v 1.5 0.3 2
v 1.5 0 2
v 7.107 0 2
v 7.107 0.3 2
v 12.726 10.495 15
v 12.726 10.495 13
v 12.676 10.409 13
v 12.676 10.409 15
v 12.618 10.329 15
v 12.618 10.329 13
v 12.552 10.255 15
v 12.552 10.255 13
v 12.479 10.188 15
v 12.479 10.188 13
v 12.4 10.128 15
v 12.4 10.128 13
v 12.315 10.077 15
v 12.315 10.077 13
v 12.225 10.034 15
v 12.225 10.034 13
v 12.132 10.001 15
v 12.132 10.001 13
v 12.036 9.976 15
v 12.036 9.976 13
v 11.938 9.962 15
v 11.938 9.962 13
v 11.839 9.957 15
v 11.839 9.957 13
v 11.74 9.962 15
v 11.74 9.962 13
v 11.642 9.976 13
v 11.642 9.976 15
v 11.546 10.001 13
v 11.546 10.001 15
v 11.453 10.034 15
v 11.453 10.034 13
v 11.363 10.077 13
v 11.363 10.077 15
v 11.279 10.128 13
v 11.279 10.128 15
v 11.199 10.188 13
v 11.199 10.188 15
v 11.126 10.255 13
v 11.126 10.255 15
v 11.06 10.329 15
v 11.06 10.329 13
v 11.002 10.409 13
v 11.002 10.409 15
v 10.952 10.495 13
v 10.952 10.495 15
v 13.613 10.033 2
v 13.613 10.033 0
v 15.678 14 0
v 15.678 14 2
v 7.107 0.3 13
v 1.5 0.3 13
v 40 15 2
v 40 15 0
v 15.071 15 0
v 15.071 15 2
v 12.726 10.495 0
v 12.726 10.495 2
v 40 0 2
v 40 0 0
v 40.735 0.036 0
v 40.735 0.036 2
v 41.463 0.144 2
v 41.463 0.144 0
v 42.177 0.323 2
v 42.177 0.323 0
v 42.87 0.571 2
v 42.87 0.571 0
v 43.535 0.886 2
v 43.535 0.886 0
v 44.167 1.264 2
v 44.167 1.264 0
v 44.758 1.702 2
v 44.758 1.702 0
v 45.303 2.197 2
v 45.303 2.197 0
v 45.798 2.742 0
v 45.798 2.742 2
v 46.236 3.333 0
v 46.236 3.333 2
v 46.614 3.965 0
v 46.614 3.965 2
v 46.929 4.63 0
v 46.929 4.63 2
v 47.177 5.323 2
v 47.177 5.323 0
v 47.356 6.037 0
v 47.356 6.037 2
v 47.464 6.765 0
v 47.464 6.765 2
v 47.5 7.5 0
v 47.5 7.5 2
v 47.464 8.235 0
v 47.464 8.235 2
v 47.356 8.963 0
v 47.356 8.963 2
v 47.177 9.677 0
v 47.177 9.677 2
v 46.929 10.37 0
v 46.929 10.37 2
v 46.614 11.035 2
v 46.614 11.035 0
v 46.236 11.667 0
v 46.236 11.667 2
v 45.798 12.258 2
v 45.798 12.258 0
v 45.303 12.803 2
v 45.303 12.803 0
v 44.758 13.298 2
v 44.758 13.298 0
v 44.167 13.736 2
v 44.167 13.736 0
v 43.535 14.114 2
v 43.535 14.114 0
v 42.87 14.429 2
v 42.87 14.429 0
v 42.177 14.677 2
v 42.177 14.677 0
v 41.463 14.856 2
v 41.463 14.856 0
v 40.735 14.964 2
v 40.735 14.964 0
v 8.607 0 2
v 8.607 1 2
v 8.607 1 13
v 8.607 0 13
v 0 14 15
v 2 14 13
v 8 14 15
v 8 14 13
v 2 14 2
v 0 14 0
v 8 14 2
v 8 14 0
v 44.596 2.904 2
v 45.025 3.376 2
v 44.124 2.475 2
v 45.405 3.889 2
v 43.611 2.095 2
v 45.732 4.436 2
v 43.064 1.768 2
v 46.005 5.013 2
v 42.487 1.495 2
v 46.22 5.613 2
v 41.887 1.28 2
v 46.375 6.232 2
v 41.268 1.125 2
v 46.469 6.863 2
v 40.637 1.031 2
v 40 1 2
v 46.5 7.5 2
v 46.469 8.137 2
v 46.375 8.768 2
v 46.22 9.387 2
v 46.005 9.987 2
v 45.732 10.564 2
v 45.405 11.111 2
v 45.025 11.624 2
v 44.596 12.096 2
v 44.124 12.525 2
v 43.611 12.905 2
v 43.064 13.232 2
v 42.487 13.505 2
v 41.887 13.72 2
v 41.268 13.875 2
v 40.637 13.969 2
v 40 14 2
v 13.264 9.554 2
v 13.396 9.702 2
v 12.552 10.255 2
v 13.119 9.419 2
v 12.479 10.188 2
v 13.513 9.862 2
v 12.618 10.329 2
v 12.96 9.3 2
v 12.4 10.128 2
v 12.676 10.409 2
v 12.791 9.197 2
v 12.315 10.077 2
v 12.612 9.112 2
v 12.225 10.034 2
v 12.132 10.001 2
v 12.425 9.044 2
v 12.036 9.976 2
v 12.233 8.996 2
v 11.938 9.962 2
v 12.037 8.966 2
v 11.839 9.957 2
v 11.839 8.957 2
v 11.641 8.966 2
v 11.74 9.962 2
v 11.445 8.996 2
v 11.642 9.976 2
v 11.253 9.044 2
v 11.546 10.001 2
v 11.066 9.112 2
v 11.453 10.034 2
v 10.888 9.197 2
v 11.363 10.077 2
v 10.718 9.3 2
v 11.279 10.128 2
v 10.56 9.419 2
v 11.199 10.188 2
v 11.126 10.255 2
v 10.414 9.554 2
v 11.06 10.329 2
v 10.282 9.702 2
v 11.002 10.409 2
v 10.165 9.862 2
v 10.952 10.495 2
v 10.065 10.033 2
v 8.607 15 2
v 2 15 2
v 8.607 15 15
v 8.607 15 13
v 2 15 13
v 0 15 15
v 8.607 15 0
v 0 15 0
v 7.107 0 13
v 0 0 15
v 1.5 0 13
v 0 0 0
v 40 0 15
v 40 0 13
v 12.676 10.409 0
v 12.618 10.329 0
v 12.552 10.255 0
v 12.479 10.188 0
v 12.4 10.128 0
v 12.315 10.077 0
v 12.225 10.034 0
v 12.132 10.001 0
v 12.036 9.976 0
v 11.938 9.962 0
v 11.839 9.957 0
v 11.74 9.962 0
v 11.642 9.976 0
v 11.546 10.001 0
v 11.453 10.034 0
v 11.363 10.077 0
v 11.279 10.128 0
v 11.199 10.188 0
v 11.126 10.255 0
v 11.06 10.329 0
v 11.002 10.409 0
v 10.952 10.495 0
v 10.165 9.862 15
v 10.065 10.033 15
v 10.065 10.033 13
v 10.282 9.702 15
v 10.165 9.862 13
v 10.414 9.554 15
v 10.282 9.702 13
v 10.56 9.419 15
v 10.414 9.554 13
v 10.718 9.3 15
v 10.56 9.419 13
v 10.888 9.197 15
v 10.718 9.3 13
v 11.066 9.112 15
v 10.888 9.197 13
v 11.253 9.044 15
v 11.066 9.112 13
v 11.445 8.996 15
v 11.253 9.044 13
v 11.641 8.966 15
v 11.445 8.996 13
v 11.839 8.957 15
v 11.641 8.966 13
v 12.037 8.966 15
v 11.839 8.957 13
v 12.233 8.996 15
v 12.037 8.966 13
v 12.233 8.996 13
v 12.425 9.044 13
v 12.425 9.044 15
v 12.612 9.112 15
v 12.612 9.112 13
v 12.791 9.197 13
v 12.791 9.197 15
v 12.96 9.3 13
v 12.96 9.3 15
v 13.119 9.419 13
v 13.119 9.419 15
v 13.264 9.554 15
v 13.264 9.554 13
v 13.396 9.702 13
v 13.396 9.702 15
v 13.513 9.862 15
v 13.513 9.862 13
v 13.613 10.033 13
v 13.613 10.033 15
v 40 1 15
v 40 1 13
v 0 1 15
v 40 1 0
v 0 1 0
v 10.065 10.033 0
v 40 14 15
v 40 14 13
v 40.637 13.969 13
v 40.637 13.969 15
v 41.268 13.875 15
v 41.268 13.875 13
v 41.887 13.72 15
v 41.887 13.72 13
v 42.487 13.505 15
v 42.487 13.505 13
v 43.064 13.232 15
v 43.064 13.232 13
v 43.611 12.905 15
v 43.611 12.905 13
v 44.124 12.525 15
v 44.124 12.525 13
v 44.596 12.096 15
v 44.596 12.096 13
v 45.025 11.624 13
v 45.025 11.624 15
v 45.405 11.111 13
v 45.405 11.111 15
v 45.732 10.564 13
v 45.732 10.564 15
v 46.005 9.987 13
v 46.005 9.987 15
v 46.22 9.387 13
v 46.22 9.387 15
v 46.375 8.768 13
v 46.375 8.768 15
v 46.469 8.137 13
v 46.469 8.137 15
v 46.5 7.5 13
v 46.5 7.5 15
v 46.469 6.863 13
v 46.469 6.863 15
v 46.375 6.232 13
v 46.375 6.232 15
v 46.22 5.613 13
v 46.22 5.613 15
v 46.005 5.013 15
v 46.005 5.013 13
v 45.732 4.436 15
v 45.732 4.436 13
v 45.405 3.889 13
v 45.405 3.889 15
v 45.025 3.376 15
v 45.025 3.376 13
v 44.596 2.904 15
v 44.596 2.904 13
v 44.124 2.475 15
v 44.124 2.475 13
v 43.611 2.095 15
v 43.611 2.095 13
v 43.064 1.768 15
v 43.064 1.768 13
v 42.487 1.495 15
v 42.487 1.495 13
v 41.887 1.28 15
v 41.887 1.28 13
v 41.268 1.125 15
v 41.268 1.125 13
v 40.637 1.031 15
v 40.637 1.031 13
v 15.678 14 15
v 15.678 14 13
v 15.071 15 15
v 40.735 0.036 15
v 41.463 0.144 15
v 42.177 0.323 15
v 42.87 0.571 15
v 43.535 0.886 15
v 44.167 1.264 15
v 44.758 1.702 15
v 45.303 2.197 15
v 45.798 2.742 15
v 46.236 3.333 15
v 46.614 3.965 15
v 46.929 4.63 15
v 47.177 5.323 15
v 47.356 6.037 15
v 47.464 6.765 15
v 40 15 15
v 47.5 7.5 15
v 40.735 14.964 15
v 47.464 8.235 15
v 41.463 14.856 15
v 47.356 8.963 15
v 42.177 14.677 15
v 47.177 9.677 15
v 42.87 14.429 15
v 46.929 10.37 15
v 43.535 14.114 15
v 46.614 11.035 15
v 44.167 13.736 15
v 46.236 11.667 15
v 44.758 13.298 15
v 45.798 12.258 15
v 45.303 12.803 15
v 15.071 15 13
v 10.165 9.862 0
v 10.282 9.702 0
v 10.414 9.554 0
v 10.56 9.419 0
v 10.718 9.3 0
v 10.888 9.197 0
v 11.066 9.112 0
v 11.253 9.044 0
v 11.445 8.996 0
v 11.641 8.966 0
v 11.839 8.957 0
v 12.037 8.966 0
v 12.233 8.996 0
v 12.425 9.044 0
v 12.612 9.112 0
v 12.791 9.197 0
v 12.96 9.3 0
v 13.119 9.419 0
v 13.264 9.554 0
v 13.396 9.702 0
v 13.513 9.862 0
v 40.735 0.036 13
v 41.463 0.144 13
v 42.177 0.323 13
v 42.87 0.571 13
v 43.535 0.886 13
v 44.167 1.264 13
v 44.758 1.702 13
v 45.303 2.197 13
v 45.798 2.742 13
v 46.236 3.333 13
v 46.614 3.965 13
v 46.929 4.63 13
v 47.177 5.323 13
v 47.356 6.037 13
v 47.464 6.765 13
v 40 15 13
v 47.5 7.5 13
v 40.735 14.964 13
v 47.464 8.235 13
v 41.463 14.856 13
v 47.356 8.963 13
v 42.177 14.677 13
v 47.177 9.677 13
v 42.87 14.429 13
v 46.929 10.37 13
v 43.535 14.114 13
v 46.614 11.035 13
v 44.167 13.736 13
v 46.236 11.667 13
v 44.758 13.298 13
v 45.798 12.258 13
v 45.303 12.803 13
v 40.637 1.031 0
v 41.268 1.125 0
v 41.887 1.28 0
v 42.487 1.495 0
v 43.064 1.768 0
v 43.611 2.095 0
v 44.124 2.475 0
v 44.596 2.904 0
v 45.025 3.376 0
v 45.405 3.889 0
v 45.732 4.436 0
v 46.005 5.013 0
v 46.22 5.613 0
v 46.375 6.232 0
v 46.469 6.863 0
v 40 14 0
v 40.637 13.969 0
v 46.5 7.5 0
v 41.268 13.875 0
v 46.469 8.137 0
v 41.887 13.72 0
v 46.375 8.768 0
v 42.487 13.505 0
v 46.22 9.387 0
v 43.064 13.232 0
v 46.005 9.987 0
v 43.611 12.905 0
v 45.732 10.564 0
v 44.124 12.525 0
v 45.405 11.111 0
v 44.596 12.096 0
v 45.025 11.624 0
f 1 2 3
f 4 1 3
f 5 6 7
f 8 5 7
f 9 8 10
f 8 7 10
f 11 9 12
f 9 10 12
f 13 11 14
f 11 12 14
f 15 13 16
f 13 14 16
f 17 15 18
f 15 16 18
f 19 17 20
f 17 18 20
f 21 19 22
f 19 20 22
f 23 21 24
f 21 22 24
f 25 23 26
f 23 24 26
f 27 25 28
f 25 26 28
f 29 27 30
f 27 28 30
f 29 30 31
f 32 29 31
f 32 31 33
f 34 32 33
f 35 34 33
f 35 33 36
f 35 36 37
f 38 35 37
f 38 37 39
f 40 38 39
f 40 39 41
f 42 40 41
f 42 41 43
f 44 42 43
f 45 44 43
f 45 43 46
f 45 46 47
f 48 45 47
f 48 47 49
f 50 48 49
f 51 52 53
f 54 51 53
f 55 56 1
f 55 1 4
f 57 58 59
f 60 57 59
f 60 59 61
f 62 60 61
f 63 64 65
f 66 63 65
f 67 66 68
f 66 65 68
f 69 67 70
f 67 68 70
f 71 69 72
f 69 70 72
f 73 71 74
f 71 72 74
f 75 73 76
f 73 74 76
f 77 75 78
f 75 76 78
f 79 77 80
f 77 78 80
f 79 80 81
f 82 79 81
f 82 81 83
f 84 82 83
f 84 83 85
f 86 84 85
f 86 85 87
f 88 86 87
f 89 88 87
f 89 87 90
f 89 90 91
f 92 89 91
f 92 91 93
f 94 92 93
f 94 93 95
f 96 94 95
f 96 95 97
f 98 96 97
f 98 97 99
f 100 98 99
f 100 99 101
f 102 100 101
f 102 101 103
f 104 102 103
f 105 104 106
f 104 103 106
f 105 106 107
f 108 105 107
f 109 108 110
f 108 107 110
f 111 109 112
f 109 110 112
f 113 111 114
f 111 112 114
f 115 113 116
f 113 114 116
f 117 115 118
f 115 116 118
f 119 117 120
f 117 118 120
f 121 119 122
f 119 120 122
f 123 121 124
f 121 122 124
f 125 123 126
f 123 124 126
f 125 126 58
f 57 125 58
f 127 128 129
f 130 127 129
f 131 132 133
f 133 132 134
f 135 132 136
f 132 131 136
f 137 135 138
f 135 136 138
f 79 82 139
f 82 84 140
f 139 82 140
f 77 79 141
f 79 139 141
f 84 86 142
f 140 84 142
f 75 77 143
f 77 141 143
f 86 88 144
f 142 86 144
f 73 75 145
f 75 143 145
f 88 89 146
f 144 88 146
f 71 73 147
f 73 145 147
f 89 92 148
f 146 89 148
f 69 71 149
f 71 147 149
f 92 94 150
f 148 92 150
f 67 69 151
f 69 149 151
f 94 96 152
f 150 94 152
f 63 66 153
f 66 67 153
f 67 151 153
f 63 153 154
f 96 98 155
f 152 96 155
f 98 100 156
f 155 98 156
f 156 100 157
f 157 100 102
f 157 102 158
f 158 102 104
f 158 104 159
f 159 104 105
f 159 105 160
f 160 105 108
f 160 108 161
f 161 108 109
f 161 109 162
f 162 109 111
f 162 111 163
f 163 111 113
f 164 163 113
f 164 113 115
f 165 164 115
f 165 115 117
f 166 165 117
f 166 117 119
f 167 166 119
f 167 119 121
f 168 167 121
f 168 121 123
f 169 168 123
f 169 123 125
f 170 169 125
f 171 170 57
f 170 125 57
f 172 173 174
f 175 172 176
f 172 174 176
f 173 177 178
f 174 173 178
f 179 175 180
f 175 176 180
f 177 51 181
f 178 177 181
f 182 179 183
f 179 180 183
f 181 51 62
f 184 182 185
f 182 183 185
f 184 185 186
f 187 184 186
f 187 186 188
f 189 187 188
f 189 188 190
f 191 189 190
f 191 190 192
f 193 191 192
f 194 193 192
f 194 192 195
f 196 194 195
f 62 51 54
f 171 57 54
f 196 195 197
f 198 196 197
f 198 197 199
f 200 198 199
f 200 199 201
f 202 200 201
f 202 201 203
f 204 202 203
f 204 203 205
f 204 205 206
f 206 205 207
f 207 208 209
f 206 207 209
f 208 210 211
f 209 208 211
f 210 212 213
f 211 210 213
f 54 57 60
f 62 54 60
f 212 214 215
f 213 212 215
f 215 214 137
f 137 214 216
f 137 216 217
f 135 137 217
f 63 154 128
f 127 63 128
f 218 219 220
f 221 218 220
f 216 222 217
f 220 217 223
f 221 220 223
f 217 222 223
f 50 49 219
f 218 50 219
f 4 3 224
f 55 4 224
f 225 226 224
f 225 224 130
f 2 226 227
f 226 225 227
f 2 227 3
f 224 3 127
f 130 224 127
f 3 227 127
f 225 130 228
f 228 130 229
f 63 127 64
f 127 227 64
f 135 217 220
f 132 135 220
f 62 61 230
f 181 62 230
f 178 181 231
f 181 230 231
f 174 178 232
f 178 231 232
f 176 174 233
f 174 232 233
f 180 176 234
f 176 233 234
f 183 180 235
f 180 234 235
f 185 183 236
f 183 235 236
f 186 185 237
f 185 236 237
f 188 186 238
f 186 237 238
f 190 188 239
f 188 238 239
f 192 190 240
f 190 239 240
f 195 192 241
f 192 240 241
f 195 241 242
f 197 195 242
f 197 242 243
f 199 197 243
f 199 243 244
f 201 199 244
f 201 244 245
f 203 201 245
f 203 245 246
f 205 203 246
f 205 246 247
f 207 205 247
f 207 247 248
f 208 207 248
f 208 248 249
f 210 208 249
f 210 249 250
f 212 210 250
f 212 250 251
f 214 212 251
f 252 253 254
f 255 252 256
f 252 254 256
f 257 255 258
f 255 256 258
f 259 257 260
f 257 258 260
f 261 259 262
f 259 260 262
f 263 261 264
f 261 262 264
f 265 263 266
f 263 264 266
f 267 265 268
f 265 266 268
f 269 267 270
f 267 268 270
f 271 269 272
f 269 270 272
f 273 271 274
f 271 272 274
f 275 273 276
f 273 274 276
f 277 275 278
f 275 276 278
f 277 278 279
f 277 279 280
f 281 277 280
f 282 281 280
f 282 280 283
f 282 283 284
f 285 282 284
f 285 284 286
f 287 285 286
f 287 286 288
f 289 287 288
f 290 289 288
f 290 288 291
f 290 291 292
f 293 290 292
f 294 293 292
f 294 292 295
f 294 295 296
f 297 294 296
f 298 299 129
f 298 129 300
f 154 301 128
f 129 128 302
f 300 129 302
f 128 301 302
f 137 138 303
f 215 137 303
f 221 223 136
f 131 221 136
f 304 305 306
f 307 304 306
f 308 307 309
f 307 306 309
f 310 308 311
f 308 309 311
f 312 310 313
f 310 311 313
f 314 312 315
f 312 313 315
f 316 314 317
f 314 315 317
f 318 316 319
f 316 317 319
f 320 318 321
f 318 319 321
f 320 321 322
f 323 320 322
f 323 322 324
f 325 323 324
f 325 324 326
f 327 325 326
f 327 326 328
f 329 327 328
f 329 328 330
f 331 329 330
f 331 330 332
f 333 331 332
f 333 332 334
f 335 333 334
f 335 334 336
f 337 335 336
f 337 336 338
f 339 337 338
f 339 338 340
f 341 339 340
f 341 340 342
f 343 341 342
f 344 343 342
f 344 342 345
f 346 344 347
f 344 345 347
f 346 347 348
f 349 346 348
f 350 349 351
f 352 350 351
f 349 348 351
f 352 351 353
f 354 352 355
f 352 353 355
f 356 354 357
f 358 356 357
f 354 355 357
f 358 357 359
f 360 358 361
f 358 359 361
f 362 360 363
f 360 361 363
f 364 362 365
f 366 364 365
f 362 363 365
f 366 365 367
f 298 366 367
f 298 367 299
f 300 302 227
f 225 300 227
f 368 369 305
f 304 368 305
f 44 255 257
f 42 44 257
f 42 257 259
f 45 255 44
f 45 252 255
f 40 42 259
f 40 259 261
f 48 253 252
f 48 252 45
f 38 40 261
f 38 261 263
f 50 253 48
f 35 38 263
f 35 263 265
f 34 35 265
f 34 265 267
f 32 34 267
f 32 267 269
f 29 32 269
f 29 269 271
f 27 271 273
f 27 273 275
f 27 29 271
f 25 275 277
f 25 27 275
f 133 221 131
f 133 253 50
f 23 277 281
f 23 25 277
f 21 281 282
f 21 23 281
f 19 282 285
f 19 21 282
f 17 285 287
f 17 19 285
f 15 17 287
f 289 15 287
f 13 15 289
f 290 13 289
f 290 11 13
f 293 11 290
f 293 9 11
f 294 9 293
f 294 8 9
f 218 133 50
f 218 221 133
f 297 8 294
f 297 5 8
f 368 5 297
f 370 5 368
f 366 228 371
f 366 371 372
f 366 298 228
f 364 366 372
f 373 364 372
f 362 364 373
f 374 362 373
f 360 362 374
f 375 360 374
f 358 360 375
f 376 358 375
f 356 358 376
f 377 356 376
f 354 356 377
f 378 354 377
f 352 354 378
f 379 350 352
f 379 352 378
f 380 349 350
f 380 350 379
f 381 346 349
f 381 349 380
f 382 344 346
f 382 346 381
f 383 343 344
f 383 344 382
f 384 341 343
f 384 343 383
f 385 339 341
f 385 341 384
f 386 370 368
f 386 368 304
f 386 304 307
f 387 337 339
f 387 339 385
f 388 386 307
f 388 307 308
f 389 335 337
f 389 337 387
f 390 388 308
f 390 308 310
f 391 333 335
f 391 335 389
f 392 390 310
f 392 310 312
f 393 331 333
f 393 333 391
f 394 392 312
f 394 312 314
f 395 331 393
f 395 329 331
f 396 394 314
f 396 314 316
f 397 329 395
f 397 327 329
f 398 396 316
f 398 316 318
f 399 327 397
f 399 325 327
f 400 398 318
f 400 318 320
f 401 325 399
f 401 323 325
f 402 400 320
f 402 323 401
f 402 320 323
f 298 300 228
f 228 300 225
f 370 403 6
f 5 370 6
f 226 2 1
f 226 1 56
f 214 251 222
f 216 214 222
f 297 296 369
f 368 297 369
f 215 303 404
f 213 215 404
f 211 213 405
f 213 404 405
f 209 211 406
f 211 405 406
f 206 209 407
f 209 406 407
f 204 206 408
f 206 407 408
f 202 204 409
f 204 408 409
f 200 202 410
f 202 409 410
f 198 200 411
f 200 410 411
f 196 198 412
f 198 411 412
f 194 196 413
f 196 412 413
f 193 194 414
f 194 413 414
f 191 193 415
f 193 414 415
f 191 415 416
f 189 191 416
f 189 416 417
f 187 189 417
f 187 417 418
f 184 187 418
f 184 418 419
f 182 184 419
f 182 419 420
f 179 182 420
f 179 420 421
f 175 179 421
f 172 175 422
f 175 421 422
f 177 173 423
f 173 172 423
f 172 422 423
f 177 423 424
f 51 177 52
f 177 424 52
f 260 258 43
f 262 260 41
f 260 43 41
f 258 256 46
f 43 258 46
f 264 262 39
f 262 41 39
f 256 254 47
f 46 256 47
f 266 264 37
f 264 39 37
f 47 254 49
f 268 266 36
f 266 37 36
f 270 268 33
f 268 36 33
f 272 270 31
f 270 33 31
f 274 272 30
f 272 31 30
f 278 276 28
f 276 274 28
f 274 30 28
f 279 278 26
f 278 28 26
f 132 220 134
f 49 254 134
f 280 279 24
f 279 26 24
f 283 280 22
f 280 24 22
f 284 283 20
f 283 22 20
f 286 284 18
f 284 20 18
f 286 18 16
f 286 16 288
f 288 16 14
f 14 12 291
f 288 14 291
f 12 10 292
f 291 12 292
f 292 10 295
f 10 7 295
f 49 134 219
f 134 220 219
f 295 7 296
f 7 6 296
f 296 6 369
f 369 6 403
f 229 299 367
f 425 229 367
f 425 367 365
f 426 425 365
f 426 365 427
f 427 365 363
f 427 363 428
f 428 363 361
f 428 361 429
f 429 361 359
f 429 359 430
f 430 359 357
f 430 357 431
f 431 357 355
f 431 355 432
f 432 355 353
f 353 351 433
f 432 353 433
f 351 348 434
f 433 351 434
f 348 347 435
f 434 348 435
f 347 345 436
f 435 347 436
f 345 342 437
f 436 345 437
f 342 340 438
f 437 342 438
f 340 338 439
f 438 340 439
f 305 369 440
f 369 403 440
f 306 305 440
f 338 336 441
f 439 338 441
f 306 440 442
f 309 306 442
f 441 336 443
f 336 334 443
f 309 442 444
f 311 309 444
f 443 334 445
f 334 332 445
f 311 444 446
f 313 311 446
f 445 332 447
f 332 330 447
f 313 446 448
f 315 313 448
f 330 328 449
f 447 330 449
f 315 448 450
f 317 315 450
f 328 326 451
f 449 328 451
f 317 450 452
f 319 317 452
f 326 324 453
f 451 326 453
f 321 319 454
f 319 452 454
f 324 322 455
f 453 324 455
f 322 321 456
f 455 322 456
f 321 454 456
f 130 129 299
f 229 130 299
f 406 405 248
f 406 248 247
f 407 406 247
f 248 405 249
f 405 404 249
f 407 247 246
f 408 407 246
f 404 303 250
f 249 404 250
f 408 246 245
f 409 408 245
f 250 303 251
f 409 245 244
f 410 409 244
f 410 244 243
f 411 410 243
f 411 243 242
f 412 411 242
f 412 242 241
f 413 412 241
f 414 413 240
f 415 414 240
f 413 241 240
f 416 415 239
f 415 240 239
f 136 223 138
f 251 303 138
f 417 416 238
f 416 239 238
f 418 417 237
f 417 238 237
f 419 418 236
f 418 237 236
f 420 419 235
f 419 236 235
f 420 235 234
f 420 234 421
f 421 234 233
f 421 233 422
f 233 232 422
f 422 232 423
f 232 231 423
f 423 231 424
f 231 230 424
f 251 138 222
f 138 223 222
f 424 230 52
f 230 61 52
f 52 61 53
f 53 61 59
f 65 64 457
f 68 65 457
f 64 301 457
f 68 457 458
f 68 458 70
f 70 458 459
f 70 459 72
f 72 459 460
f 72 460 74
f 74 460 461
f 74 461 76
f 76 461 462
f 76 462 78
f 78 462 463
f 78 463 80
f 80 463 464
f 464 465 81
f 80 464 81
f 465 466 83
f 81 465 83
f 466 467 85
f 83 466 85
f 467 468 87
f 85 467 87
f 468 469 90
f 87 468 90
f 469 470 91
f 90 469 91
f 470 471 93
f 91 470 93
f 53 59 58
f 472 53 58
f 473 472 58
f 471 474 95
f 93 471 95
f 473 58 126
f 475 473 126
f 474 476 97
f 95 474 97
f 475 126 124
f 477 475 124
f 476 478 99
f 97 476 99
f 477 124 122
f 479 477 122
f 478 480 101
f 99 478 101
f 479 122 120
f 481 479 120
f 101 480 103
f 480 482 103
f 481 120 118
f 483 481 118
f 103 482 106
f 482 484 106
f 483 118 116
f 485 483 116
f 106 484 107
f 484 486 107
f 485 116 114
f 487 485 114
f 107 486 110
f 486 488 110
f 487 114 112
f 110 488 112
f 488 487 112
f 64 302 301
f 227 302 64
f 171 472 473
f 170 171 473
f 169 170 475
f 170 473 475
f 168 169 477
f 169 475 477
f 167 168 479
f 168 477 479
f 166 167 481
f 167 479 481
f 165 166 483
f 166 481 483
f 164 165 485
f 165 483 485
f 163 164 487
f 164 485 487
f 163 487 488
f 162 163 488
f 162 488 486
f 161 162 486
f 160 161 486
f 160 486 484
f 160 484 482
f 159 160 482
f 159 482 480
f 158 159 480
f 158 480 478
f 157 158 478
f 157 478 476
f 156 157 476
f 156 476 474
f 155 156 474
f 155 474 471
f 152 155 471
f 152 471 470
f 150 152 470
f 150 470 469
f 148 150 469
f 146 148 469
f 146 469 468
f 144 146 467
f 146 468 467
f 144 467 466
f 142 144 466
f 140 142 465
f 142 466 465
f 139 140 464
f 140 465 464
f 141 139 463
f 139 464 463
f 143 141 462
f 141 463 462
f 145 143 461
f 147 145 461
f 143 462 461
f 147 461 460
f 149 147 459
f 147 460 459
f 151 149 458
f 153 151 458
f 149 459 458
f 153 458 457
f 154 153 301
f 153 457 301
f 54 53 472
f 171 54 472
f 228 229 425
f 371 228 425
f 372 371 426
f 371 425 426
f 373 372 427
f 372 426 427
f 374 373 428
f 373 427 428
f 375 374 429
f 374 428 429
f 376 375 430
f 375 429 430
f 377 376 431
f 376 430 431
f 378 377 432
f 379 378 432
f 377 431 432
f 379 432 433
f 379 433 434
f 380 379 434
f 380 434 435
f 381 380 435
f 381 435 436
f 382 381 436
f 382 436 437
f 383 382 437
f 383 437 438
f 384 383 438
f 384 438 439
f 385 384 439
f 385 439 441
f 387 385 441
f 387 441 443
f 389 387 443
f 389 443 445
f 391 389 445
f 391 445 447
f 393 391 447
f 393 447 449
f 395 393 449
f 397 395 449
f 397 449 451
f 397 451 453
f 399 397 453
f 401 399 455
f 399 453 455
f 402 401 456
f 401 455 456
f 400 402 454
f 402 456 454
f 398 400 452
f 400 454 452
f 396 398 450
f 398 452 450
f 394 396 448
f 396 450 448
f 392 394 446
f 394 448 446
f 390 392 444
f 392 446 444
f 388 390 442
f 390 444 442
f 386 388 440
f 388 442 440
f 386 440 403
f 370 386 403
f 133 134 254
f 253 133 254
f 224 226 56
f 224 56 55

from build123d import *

# Parameters (mm, degrees)
F1_DEPTH = 15
F2_W     = 7.4999995679
F2_H     = 11
F2_W_2   = 24.9287047806
F2_W_3   = 6.4644805853
F3_DEPTH = 25
F4_W     = 6.6068146341
F4_H     = 11
F5_DEPTH = 3
F6_W     = 5.6068146341
F6_H     = 11
F7_DEPTH = 0.3


with BuildPart() as f1:
    # F0 (on Top) → F1 (new body)
    with BuildSketch(Plane.XY):
        with BuildLine():
            Line((0, 0.9999995679), (0, 0))
            Line((0, 0), (40, 0))
            ThreePointArc((40, 0), (47.4999995679, 7.4999995679), (40, 14.9999991357))
            Line((40, 14.9999991357), (15.0712952194, 14.9999991357))
            Line((15.0712952194, 14.9999991357), (12.7260657599, 10.4948552605))
            ThreePointArc((12.7260657599, 10.4948552605), (11.8390549267, 9.9566038737), (10.9520440936, 10.4948552605))
            Line((10.9520440936, 10.4948552605), (8.6068146341, 14.9999991357))
            Line((8.6068146341, 14.9999991357), (0, 14.9999991357))
            Line((0, 14.9999991357), (0, 13.9999995679))
            Line((0, 13.9999995679), (8, 13.9999995679))
            Line((8, 13.9999995679), (10.0650336437, 10.0331068468))
            ThreePointArc((10.0650336437, 10.0331068468), (11.8390549267, 8.9566043058), (13.6130762098, 10.0331068468))
            Line((13.6130762098, 10.0331068468), (15.6781098535, 13.9999995679))
            Line((15.6781098535, 13.9999995679), (40, 13.9999995679))
            ThreePointArc((40, 13.9999995679), (46.5, 7.4999995679), (40, 0.9999995679))
            Line((40, 0.9999995679), (0, 0.9999995679))
        make_face()
    extrude(amount=F1_DEPTH)

    # F2 (on face) → F3 (cut)
    with BuildSketch(Plane(origin=(0, 14.9999991357, 0), x_dir=(-1, 0, 0), z_dir=(0, 1, 0))):
        with Locations((-43.7499997839, 7.5)):
            Rectangle(F2_W, F2_H)
        with Locations((-27.5356476097, 7.5)):
            Rectangle(F2_W_2, F2_H)
        with Locations((-11.8390549267, 7.5)):
            Rectangle(F2_W_3, F2_H)
    extrude(amount=-F3_DEPTH, mode=Mode.SUBTRACT)

    # F4 (on face) → F5 (cut)
    with BuildSketch(Plane(origin=(0, 14.9999991357, 0), x_dir=(-1, 0, 0), z_dir=(0, 1, 0))):
        with Locations((-5.303407317, 7.5)):
            Rectangle(F4_W, F4_H)
    extrude(amount=-F5_DEPTH, mode=Mode.SUBTRACT)

    # F6 (on face) → F7 (cut)
    with BuildSketch(Plane.XZ):
        with Locations((4.303407317, 7.5)):
            Rectangle(F6_W, F6_H)
    extrude(amount=-F7_DEPTH, mode=Mode.SUBTRACT)


solid = f1.part
